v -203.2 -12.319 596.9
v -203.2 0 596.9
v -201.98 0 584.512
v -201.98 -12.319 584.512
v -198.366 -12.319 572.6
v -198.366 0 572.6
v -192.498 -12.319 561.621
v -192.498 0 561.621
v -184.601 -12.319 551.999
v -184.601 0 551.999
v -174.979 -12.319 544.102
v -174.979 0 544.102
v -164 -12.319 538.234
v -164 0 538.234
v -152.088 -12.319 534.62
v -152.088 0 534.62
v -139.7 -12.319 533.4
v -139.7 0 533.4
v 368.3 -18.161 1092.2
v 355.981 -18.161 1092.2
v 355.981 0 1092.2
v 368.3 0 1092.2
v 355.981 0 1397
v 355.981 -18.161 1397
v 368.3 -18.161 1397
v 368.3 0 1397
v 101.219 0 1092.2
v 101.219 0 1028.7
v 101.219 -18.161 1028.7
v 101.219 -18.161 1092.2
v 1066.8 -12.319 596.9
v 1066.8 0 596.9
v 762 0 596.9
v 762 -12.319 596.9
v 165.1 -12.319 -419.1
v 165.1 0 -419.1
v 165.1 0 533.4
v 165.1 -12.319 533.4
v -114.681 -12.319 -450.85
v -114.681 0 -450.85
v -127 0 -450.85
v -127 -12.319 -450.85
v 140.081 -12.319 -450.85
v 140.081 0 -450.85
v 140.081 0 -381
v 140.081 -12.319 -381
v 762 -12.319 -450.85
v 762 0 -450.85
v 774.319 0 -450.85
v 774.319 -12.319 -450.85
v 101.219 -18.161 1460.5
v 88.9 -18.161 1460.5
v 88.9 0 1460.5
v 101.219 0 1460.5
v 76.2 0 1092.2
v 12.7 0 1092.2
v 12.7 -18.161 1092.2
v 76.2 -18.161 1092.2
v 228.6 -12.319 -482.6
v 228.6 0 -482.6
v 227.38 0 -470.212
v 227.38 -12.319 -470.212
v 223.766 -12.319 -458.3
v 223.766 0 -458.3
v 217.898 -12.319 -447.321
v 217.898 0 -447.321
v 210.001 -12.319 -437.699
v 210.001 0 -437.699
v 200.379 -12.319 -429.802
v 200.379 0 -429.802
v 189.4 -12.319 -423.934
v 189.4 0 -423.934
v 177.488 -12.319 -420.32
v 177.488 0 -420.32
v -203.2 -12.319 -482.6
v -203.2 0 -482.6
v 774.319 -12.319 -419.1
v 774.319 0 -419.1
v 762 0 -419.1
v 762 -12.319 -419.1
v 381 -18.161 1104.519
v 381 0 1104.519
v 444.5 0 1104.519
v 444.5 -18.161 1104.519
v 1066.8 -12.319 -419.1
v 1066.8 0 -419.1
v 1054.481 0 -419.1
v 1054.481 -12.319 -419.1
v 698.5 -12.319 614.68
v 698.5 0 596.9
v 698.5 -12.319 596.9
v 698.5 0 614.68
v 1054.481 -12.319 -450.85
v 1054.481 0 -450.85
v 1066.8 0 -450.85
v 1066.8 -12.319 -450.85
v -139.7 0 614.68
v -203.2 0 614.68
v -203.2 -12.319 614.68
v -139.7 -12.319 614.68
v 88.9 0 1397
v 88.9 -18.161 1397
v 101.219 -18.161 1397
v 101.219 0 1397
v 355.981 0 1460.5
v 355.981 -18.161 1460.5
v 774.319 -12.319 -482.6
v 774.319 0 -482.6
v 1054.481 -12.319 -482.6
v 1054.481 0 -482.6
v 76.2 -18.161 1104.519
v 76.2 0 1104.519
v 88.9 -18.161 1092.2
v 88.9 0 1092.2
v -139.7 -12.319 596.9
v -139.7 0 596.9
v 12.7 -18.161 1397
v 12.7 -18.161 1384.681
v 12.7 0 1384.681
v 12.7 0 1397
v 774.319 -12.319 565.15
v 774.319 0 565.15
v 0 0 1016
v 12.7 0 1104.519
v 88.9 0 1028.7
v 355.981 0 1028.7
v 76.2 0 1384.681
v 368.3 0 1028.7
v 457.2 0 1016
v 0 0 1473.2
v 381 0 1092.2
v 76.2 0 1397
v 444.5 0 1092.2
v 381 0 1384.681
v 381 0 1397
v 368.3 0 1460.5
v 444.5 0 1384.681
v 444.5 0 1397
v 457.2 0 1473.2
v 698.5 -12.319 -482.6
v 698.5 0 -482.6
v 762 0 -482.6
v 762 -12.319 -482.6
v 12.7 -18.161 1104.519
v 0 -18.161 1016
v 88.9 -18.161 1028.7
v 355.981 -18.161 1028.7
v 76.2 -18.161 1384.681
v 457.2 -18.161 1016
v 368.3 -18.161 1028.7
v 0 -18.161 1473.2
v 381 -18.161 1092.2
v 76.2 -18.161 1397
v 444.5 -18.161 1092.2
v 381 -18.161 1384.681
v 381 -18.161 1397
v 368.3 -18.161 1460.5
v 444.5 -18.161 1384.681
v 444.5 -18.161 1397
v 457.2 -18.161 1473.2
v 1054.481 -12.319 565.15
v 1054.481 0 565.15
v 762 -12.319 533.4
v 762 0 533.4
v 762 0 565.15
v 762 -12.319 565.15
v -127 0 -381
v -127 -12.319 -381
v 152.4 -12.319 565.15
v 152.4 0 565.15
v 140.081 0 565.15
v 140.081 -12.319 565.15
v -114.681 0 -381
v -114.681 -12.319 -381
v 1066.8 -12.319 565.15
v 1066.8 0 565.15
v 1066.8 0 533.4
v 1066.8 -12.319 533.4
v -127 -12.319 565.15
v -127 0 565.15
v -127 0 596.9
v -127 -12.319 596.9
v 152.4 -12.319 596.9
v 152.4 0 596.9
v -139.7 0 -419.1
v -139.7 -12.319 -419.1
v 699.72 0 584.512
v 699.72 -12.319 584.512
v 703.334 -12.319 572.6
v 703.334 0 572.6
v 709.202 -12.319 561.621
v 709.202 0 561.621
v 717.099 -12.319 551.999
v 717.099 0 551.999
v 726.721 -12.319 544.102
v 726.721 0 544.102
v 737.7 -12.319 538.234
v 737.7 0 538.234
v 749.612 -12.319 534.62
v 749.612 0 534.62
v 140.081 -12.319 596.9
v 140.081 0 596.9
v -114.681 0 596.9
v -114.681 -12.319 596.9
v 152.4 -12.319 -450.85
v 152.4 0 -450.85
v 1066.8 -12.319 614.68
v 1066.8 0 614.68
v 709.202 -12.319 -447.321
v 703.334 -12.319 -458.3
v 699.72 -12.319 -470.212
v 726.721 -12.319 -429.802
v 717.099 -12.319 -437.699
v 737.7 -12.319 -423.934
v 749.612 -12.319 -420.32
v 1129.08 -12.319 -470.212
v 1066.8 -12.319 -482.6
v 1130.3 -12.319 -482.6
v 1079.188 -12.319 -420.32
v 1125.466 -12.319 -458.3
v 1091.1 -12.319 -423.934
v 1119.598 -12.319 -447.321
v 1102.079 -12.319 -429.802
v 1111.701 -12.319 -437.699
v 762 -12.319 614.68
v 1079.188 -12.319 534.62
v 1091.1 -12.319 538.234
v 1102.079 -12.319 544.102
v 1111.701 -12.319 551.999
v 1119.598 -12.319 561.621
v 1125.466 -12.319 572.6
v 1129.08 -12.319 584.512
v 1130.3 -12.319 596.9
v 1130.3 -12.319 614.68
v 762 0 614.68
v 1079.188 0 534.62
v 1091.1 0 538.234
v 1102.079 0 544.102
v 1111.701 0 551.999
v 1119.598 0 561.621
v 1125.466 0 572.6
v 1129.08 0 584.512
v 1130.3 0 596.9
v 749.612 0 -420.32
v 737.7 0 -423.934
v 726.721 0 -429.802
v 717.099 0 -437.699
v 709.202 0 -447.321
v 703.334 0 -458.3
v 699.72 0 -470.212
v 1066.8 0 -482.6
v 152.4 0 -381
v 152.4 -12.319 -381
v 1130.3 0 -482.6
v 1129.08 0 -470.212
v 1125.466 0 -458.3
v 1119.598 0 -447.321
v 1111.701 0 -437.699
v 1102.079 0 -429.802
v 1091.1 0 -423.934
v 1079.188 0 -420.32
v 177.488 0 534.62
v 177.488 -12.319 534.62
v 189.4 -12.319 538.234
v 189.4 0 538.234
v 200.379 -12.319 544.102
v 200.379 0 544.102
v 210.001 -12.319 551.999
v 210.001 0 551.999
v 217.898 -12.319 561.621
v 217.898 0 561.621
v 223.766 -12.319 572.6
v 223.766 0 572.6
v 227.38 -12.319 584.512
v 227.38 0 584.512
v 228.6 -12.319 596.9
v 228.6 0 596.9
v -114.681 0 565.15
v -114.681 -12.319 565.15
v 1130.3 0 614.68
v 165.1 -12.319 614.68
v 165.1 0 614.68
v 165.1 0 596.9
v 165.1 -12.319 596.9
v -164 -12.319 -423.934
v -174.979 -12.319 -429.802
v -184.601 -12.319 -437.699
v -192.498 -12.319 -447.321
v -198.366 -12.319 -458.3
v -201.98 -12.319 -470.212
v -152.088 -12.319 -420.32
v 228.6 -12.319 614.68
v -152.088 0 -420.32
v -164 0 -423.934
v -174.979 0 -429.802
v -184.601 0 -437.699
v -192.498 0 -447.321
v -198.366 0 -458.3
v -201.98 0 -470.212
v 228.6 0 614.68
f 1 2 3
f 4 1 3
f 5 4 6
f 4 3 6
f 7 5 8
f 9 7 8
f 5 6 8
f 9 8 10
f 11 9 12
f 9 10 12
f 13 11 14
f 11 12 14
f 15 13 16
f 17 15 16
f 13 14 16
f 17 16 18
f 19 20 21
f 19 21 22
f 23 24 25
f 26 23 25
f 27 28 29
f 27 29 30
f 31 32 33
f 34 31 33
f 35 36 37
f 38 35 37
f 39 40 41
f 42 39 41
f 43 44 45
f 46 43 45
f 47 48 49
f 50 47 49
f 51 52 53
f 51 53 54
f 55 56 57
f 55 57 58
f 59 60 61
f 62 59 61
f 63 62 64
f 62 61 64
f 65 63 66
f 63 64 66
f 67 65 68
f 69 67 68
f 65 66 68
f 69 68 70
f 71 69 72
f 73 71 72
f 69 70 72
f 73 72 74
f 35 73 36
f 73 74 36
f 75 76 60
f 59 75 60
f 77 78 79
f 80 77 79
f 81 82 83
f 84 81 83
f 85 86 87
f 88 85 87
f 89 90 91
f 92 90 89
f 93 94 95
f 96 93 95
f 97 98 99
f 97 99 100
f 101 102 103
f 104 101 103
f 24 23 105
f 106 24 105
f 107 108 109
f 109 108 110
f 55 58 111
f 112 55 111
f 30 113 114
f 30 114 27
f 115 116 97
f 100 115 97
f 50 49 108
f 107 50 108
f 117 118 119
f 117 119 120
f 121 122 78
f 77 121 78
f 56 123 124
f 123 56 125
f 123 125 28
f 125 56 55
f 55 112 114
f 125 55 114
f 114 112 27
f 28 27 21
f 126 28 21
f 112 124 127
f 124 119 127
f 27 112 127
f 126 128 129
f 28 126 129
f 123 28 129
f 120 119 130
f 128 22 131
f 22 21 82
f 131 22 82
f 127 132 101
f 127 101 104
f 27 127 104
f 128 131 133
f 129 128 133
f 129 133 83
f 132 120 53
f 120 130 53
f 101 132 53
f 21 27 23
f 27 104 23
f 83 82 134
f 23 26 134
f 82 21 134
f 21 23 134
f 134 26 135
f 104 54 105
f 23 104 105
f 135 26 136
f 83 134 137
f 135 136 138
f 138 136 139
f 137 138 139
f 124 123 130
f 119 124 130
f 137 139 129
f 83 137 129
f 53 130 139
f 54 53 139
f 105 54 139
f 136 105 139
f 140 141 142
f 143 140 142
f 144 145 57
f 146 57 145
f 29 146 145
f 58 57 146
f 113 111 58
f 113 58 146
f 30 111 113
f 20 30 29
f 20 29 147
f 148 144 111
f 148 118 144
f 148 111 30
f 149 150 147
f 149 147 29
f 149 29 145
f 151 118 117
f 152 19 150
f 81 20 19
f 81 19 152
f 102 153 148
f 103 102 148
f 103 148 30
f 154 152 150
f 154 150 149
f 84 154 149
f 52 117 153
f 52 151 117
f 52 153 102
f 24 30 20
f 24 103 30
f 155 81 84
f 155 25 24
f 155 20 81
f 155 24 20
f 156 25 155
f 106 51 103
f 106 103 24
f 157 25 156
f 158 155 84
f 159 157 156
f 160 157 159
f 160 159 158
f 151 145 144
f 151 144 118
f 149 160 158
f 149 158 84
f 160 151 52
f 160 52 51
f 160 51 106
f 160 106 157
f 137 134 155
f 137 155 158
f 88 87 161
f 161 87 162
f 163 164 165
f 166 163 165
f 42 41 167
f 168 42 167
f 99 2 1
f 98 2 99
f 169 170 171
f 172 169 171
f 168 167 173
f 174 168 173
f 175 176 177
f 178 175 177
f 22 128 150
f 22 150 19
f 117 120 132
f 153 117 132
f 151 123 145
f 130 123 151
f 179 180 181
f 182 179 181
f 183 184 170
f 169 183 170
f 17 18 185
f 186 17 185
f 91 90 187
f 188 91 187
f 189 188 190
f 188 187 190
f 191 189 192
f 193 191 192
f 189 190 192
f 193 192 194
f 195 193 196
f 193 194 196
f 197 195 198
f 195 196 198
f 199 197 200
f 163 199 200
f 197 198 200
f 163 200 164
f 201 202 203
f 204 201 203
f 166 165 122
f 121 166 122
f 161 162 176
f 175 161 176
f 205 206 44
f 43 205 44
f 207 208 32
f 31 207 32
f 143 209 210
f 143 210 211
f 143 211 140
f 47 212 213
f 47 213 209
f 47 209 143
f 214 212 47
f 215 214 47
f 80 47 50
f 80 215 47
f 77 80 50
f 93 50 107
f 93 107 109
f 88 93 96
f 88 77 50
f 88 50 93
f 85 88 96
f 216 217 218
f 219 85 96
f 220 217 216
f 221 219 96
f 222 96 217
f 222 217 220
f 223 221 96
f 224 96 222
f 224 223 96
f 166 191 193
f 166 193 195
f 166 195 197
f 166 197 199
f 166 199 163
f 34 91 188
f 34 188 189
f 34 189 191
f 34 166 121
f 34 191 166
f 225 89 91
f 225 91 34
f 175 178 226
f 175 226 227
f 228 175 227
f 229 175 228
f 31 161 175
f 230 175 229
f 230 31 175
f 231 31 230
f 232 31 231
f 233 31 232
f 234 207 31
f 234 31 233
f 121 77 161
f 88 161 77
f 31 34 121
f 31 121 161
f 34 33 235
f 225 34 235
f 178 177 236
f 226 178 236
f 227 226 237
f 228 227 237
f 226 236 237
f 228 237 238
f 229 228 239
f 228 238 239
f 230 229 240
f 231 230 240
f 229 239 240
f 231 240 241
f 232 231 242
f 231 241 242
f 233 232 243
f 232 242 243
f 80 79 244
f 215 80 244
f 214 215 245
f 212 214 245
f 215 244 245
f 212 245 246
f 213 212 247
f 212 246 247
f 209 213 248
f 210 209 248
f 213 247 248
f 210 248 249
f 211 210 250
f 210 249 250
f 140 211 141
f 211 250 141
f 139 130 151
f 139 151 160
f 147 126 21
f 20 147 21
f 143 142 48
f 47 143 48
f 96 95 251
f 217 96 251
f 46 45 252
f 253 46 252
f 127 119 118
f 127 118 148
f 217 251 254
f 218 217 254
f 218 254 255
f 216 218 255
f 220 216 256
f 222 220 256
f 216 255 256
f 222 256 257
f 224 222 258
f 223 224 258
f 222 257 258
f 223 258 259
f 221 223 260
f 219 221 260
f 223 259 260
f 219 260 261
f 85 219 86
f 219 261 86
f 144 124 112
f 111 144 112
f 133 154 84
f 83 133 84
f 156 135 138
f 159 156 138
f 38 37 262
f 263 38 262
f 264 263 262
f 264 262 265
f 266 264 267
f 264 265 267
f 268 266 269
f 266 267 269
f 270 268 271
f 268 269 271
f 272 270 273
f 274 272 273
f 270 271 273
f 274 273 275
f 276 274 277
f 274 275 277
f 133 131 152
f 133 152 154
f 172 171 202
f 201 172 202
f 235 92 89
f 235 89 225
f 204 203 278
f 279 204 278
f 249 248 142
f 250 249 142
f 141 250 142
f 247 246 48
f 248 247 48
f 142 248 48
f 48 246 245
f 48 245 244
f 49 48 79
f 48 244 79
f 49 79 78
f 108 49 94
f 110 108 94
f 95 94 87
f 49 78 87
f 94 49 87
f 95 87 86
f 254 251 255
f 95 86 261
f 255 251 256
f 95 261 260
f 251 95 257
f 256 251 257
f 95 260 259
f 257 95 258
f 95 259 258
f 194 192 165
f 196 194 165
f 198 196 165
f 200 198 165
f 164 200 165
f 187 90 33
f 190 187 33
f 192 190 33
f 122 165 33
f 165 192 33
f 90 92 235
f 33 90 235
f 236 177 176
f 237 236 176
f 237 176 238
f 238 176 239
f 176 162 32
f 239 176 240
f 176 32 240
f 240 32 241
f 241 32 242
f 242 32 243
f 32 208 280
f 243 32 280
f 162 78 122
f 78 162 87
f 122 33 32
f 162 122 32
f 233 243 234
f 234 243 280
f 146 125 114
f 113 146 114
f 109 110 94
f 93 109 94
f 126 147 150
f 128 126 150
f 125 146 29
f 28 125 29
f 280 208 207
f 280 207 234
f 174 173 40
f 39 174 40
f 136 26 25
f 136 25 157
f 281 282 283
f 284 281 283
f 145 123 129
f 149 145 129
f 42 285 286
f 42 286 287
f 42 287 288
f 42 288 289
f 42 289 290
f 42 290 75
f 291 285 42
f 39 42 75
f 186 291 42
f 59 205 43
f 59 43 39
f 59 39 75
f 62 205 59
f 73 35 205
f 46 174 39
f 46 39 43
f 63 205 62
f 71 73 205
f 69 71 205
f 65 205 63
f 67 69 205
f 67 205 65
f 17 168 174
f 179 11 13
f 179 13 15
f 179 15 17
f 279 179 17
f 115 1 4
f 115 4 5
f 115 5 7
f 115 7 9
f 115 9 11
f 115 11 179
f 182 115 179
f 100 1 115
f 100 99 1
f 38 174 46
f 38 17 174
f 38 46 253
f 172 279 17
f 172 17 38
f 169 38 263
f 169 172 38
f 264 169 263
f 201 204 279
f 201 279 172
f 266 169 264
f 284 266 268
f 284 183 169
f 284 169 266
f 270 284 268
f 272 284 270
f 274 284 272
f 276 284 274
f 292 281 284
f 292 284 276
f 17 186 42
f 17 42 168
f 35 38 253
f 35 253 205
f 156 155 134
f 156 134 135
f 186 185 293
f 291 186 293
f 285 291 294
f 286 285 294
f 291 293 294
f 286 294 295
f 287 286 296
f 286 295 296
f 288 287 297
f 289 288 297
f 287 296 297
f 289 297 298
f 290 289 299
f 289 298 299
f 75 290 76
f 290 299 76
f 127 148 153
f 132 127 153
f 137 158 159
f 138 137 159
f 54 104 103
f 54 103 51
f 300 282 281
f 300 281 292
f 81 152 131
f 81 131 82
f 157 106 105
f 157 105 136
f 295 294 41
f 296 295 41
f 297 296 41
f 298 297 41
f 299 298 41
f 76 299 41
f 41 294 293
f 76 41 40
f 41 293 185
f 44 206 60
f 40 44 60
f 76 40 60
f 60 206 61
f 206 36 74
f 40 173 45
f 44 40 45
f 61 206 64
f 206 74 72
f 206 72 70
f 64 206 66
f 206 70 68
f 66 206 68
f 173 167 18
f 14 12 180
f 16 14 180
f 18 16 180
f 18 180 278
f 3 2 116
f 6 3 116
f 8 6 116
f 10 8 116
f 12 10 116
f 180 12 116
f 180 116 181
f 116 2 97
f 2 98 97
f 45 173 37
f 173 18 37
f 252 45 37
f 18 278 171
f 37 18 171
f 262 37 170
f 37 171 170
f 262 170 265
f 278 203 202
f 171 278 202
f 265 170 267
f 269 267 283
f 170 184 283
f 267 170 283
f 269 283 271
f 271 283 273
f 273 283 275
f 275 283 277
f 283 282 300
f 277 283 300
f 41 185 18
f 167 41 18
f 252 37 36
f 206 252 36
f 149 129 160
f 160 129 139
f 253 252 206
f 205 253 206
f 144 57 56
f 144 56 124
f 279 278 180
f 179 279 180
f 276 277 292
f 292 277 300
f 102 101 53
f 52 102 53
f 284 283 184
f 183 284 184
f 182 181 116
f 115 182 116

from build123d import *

# Parameters (mm, degrees)
F0_W     = 63.5
F0_H     = 17.78
F0_W_2   = 12.7
F0_H_2   = 38.1
F1_DEPTH = 12.319
F0_W_3   = 457.2
F0_H_3   = 457.2
F0_H_4   = 12.319
F0_W_4   = 12.319
F0_H_5   = 63.5
F2_DEPTH = 18.161


with BuildPart() as f1:
    # F0 (on Front) → F1 (new body)
    with BuildSketch(Plane.XZ):
        with BuildLine():
            Line((-139.7, 565.15), (-139.7, 596.9))
            Line((-139.7, 596.9), (-203.2, 596.9))
            ThreePointArc((-203.2, 596.9), (-184.601281, 551.998719), (-139.7, 533.4))
            Line((-139.7, 533.4), (-139.7, 565.15))
        make_face()
        with BuildLine():
            Line((228.6, 596.9), (165.1, 596.9))
            Line((165.1, 596.9), (165.1, 533.4))
            ThreePointArc((165.1, 533.4), (210.001281, 551.998719), (228.6, 596.9))
        make_face()
        with BuildLine():
            Line((-139.7, -482.6), (-139.7, -419.1))
            ThreePointArc((-139.7, -419.1), (-184.601281, -437.698719), (-203.2, -482.6))
            Line((-203.2, -482.6), (-139.7, -482.6))
        make_face()
        with BuildLine():
            Line((165.1, -419.1), (165.1, -482.6))
            Line((165.1, -482.6), (228.6, -482.6))
            ThreePointArc((228.6, -482.6), (210.001281, -437.698719), (165.1, -419.1))
        make_face()
        with Locations((-171.45, 605.79)):
            Rectangle(F0_W, F0_H)
        with Locations((196.85, 605.79)):
            Rectangle(F0_W, F0_H)
        with Locations((730.25, 605.79)):
            Rectangle(F0_W, F0_H)
        with BuildLine():
            ThreePointArc((698.5, 596.9), (717.098719, 551.998719), (762, 533.4))
            Line((762, 533.4), (762, 565.15))
            Line((762, 565.15), (762, 596.9))
            Line((762, 596.9), (698.5, 596.9))
        make_face()
        with Locations((1098.55, 605.79)):
            Rectangle(F0_W, F0_H)
        with BuildLine():
            Line((1066.8, 565.15), (1066.8, 533.4))
            ThreePointArc((1066.8, 533.4), (1111.701281, 551.998719), (1130.3, 596.9))
            Line((1130.3, 596.9), (1066.8, 596.9))
            Line((1066.8, 596.9), (1066.8, 565.15))
        make_face()
        with BuildLine():
            Line((698.5, -482.6), (762, -482.6))
            Line((762, -482.6), (762, -450.85))
            Line((762, -450.85), (762, -419.1))
            ThreePointArc((762, -419.1), (717.098719, -437.698719), (698.5, -482.6))
        make_face()
        with BuildLine():
            Line((1066.8, -450.85), (1066.8, -482.6))
            Line((1066.8, -482.6), (1130.3, -482.6))
            ThreePointArc((1130.3, -482.6), (1111.701281, -437.698719), (1066.8, -419.1))
            Line((1066.8, -419.1), (1066.8, -450.85))
        make_face()
        Polygon((-127, 596.9), (-139.7, 596.9), (-139.7, 565.15), (-139.7, 533.4), (-139.7, -381), (-127, -381), (-114.681, -381), (-114.681, -450.85), (-127, -450.85), (-127, -419.1), (-139.7, -419.1), (-139.7, -482.6), (165.1, -482.6), (165.1, -419.1), (152.4, -419.1), (152.4, -450.85), (140.081, -450.85), (140.081, -381), (152.4, -381), (165.1, -381), (165.1, 533.4), (165.1, 596.9), (152.4, 596.9), (152.4, 565.15), (140.081, 565.15), (140.081, 596.9), (-114.681, 596.9), (-114.681, 565.15), (-127, 565.15), align=None)
        Polygon((774.319, -450.85), (774.319, -482.6), (1054.481, -482.6), (1054.481, -450.85), (1066.8, -450.85), (1066.8, -419.1), (1054.481, -419.1), (1054.481, 533.4), (1054.481, 565.15), (1066.8, 565.15), (1066.8, 596.9), (762, 596.9), (762, 565.15), (774.319, 565.15), (774.319, 533.4), (774.319, -419.1), (762, -419.1), (762, -450.85), align=None)
        with Locations((-133.35, -400.05)):
            Rectangle(F0_W_2, F0_H_2)
        with Locations((158.75, -400.05)):
            Rectangle(F0_W_2, F0_H_2)
    extrude(amount=F1_DEPTH)


with BuildPart() as f2:
    # F0 (on Front) → F2 (new body)
    with BuildSketch(Plane.XZ):
        with Locations((228.6, 1244.6)):
            Rectangle(F0_W_3, F0_H_3)
        with Locations((44.45, 1098.3595)):
            Rectangle(F0_W, F0_H_4, mode=Mode.SUBTRACT)
        with Locations((95.0595, 1060.45)):
            Rectangle(F0_W_4, F0_H_5, mode=Mode.SUBTRACT)
        with Locations((44.45, 1390.8405)):
            Rectangle(F0_W, F0_H_4, mode=Mode.SUBTRACT)
        with Locations((95.0595, 1428.75)):
            Rectangle(F0_W_4, F0_H_5, mode=Mode.SUBTRACT)
        with Locations((362.1405, 1060.45)):
            Rectangle(F0_W_4, F0_H_5, mode=Mode.SUBTRACT)
        with Locations((412.75, 1098.3595)):
            Rectangle(F0_W, F0_H_4, mode=Mode.SUBTRACT)
        with Locations((362.1405, 1428.75)):
            Rectangle(F0_W_4, F0_H_5, mode=Mode.SUBTRACT)
        with Locations((412.75, 1390.8405)):
            Rectangle(F0_W, F0_H_4, mode=Mode.SUBTRACT)
    extrude(amount=F2_DEPTH)


solid = Compound([f1.part, f2.part])
